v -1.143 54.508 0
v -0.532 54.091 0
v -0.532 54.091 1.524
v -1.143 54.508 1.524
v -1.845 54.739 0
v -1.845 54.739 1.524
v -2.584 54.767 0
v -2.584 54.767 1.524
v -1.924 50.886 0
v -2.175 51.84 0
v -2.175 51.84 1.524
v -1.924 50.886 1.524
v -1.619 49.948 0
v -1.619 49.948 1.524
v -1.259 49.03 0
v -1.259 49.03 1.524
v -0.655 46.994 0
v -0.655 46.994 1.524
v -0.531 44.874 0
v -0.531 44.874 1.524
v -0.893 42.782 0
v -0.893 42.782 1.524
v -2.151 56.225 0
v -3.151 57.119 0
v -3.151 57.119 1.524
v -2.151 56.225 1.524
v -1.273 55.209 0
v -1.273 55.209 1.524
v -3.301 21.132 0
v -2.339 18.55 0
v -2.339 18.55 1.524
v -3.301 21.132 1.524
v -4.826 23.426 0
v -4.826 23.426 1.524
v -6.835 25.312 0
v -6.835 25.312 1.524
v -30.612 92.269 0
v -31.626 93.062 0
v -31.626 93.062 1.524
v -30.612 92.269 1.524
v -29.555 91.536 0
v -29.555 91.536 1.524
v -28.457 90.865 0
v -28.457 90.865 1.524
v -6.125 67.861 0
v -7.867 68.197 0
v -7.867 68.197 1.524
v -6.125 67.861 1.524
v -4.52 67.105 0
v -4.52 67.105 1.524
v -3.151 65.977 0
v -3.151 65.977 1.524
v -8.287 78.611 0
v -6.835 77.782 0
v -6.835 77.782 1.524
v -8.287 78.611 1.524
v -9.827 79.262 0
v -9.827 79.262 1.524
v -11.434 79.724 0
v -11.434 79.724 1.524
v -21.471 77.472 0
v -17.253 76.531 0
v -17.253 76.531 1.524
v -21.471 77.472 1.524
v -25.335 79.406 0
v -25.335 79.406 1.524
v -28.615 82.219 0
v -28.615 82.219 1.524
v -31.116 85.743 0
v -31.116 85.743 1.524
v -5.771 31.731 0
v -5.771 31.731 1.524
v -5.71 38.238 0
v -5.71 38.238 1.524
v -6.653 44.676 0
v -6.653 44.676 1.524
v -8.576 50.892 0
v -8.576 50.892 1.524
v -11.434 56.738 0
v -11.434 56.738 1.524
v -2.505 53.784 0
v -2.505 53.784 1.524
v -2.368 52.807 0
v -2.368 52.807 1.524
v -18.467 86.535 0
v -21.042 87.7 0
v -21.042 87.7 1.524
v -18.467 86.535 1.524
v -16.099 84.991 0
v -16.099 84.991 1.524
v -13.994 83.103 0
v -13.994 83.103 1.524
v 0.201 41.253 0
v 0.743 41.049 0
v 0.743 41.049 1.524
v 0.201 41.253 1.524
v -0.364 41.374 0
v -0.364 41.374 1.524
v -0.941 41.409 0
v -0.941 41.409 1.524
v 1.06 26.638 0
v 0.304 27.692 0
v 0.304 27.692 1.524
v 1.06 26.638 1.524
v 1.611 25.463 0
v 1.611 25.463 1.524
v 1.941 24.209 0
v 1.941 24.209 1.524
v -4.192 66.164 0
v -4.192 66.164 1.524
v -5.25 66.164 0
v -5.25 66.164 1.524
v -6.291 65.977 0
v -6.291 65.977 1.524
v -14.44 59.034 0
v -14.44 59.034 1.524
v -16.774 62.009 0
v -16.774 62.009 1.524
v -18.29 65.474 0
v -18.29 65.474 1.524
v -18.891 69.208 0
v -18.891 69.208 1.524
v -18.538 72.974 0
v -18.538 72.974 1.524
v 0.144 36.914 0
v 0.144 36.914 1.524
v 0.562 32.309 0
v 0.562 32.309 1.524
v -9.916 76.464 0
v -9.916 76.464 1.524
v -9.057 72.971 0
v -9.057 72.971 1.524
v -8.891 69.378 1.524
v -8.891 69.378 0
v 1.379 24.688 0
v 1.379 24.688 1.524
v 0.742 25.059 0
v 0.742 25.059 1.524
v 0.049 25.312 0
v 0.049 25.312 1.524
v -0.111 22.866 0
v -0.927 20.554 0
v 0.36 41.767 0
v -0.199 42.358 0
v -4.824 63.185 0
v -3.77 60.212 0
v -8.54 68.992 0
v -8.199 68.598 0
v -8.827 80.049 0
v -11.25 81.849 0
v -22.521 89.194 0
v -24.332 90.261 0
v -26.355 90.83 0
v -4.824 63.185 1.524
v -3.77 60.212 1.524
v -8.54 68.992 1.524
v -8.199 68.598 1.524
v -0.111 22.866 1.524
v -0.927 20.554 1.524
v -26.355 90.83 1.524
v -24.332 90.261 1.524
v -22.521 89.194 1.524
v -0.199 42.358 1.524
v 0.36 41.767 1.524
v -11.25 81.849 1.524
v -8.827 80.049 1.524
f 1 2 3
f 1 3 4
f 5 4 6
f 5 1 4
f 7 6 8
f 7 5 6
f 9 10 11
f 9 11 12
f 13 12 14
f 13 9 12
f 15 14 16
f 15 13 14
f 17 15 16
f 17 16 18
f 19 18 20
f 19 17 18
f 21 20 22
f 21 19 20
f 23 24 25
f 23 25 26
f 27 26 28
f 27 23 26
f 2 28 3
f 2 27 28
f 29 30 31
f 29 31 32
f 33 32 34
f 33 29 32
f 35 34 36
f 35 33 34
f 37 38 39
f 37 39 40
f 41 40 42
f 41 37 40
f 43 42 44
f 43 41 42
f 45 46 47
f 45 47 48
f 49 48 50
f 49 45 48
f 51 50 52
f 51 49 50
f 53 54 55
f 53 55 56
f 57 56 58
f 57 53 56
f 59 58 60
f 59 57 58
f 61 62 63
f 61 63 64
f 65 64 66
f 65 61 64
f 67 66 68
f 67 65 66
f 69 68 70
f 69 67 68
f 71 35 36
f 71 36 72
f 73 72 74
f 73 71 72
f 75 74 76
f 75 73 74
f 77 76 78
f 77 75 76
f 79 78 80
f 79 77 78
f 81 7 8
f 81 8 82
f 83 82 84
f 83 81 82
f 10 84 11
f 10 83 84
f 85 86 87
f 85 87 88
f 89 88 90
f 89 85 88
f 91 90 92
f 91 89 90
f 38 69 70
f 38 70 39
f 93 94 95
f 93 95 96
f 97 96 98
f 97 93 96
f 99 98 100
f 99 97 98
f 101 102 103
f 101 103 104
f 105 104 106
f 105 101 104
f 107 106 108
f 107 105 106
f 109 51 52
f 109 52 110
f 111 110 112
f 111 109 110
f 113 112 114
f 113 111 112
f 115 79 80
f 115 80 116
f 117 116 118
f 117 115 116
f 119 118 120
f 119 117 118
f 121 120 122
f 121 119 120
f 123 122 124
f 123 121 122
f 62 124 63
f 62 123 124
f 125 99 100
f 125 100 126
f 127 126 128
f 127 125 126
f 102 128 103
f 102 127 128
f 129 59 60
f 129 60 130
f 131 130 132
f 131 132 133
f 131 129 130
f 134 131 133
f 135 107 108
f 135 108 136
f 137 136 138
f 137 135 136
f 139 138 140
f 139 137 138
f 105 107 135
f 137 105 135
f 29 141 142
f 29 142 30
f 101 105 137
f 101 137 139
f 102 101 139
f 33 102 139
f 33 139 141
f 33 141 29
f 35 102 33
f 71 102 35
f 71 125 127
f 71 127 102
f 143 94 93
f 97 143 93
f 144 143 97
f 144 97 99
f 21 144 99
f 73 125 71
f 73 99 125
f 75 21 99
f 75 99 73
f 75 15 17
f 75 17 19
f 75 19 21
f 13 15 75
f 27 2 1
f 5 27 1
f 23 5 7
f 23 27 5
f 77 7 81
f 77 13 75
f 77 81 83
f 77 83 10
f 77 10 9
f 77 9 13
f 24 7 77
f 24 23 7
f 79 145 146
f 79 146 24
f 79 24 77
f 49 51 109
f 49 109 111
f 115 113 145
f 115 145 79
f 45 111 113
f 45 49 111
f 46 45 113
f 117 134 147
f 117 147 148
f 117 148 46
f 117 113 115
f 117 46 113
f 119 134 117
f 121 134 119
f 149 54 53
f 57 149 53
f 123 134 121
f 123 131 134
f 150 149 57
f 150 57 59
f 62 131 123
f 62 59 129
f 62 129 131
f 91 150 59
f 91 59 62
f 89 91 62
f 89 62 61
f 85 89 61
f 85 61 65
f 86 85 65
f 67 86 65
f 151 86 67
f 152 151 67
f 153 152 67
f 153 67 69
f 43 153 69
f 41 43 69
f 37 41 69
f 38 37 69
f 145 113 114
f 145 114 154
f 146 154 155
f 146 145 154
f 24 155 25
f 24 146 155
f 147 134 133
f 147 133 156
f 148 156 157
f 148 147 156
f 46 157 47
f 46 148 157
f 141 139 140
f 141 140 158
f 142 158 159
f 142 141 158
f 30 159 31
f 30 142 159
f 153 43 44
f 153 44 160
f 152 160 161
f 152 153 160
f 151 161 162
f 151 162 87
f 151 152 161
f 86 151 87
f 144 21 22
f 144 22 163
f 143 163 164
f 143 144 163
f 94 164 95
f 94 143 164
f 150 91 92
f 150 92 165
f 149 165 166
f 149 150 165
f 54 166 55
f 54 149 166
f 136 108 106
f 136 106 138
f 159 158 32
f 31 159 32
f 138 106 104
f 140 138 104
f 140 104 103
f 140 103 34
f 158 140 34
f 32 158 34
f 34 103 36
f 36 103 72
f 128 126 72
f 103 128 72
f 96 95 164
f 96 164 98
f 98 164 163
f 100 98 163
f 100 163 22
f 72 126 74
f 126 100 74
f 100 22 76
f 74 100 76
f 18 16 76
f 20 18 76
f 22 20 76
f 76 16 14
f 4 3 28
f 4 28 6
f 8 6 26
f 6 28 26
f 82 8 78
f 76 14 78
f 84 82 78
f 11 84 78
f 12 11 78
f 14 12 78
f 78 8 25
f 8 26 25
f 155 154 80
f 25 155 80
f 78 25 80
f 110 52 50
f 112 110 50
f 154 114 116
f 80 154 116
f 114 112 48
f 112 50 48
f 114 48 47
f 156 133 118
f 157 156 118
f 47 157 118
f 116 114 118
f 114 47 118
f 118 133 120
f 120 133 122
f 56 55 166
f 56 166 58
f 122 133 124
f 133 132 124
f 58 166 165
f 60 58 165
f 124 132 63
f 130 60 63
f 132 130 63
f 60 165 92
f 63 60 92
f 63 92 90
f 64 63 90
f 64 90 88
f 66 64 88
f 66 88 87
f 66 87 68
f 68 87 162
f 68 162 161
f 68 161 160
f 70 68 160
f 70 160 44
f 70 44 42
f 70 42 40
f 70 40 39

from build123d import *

# Parameters (mm, degrees)
BOSS_EXTRUDE1_DEPTH = 1.524


with BuildPart() as part:
    # Sketch1 → Boss-Extrude1 (new body)
    with BuildSketch(Plane.XY):
        with BuildLine():
            Line((-31.115654525, 85.743001786), (-31.626029854, 93.062039695))
            ThreePointArc((-31.626029854, 93.062039695), (-30.088685306, 91.89525557), (-28.45677625, 90.864873946))
            ThreePointArc((-28.45677625, 90.864873946), (-24.332080512, 90.260671192), (-21.042280839, 87.700320822))
            ThreePointArc((-21.042280839, 87.700320822), (-17.253316375, 85.808122938), (-13.994450183, 83.103228173))
            ThreePointArc((-13.994450183, 83.103228173), (-9.99101498, 81.01245123), (-6.834531764, 77.782055688))
            ThreePointArc((-6.834531764, 77.782055688), (-9.047280649, 78.959528297), (-11.434463645, 79.723764333))
            ThreePointArc((-11.434463645, 79.723764333), (-9.401311851, 74.738116942), (-8.891074145, 69.378075561))
            ThreePointArc((-8.891074145, 69.378075561), (-8.368327541, 68.796388825), (-7.866530285, 68.196536356))
            ThreePointArc((-7.866530285, 68.196536356), (-5.298466146, 67.533161121), (-3.150709885, 65.976831091))
            ThreePointArc((-3.150709885, 65.976831091), (-4.721037121, 66.188066002), (-6.291364357, 65.976831091))
            ThreePointArc((-6.291364357, 65.976831091), (-4.243849878, 61.717361935), (-3.150709885, 57.119488733))
            ThreePointArc((-3.150709885, 57.119488733), (-1.695723101, 55.731011208), (-0.531968435, 54.090727251))
            ThreePointArc((-0.531968435, 54.090727251), (-1.486021988, 54.647848886), (-2.584432422, 54.76658058))
            ThreePointArc((-2.584432422, 54.76658058), (-2.443936558, 53.294197652), (-2.174566125, 51.839862702))
            ThreePointArc((-2.174566125, 51.839862702), (-1.778406294, 50.414833592), (-1.258523697, 49.030141329))
            ThreePointArc((-1.258523697, 49.030141329), (-0.531968435, 45.93780464), (-0.893428223, 42.781893428))
            ThreePointArc((-0.893428223, 42.781893428), (0.100022048, 42.0811278), (0.742668626, 41.049129115))
            ThreePointArc((0.742668626, 41.049129115), (-0.079058418, 41.323600355), (-0.941146572, 41.409471254))
            ThreePointArc((-0.941146572, 41.409471254), (0.437078702, 34.619334125), (0.303865798, 27.692017078))
            ThreePointArc((0.303865798, 27.692017078), (1.362217268, 26.063134365), (1.940723645, 24.208761938))
            ThreePointArc((1.940723645, 24.208761938), (1.068913801, 24.887622398), (0.048705917, 25.311980504))
            ThreePointArc((0.048705917, 25.311980504), (-0.439629904, 21.681833995), (-2.339389119, 18.550165034))
            ThreePointArc((-2.339389119, 18.550165034), (-3.997880754, 22.322683164), (-6.834531764, 25.311980504))
            ThreePointArc((-6.834531764, 25.311980504), (-6.056862602, 41.475358139), (-11.434463645, 56.737761388))
            ThreePointArc((-11.434463645, 56.737761388), (-18.290136293, 65.474182448), (-17.253316375, 76.530868427))
            ThreePointArc((-17.253316375, 76.530868427), (-25.334641834, 79.406189783), (-31.115654525, 85.743001786))
        make_face()
    extrude(amount=BOSS_EXTRUDE1_DEPTH)


solid = part.part
